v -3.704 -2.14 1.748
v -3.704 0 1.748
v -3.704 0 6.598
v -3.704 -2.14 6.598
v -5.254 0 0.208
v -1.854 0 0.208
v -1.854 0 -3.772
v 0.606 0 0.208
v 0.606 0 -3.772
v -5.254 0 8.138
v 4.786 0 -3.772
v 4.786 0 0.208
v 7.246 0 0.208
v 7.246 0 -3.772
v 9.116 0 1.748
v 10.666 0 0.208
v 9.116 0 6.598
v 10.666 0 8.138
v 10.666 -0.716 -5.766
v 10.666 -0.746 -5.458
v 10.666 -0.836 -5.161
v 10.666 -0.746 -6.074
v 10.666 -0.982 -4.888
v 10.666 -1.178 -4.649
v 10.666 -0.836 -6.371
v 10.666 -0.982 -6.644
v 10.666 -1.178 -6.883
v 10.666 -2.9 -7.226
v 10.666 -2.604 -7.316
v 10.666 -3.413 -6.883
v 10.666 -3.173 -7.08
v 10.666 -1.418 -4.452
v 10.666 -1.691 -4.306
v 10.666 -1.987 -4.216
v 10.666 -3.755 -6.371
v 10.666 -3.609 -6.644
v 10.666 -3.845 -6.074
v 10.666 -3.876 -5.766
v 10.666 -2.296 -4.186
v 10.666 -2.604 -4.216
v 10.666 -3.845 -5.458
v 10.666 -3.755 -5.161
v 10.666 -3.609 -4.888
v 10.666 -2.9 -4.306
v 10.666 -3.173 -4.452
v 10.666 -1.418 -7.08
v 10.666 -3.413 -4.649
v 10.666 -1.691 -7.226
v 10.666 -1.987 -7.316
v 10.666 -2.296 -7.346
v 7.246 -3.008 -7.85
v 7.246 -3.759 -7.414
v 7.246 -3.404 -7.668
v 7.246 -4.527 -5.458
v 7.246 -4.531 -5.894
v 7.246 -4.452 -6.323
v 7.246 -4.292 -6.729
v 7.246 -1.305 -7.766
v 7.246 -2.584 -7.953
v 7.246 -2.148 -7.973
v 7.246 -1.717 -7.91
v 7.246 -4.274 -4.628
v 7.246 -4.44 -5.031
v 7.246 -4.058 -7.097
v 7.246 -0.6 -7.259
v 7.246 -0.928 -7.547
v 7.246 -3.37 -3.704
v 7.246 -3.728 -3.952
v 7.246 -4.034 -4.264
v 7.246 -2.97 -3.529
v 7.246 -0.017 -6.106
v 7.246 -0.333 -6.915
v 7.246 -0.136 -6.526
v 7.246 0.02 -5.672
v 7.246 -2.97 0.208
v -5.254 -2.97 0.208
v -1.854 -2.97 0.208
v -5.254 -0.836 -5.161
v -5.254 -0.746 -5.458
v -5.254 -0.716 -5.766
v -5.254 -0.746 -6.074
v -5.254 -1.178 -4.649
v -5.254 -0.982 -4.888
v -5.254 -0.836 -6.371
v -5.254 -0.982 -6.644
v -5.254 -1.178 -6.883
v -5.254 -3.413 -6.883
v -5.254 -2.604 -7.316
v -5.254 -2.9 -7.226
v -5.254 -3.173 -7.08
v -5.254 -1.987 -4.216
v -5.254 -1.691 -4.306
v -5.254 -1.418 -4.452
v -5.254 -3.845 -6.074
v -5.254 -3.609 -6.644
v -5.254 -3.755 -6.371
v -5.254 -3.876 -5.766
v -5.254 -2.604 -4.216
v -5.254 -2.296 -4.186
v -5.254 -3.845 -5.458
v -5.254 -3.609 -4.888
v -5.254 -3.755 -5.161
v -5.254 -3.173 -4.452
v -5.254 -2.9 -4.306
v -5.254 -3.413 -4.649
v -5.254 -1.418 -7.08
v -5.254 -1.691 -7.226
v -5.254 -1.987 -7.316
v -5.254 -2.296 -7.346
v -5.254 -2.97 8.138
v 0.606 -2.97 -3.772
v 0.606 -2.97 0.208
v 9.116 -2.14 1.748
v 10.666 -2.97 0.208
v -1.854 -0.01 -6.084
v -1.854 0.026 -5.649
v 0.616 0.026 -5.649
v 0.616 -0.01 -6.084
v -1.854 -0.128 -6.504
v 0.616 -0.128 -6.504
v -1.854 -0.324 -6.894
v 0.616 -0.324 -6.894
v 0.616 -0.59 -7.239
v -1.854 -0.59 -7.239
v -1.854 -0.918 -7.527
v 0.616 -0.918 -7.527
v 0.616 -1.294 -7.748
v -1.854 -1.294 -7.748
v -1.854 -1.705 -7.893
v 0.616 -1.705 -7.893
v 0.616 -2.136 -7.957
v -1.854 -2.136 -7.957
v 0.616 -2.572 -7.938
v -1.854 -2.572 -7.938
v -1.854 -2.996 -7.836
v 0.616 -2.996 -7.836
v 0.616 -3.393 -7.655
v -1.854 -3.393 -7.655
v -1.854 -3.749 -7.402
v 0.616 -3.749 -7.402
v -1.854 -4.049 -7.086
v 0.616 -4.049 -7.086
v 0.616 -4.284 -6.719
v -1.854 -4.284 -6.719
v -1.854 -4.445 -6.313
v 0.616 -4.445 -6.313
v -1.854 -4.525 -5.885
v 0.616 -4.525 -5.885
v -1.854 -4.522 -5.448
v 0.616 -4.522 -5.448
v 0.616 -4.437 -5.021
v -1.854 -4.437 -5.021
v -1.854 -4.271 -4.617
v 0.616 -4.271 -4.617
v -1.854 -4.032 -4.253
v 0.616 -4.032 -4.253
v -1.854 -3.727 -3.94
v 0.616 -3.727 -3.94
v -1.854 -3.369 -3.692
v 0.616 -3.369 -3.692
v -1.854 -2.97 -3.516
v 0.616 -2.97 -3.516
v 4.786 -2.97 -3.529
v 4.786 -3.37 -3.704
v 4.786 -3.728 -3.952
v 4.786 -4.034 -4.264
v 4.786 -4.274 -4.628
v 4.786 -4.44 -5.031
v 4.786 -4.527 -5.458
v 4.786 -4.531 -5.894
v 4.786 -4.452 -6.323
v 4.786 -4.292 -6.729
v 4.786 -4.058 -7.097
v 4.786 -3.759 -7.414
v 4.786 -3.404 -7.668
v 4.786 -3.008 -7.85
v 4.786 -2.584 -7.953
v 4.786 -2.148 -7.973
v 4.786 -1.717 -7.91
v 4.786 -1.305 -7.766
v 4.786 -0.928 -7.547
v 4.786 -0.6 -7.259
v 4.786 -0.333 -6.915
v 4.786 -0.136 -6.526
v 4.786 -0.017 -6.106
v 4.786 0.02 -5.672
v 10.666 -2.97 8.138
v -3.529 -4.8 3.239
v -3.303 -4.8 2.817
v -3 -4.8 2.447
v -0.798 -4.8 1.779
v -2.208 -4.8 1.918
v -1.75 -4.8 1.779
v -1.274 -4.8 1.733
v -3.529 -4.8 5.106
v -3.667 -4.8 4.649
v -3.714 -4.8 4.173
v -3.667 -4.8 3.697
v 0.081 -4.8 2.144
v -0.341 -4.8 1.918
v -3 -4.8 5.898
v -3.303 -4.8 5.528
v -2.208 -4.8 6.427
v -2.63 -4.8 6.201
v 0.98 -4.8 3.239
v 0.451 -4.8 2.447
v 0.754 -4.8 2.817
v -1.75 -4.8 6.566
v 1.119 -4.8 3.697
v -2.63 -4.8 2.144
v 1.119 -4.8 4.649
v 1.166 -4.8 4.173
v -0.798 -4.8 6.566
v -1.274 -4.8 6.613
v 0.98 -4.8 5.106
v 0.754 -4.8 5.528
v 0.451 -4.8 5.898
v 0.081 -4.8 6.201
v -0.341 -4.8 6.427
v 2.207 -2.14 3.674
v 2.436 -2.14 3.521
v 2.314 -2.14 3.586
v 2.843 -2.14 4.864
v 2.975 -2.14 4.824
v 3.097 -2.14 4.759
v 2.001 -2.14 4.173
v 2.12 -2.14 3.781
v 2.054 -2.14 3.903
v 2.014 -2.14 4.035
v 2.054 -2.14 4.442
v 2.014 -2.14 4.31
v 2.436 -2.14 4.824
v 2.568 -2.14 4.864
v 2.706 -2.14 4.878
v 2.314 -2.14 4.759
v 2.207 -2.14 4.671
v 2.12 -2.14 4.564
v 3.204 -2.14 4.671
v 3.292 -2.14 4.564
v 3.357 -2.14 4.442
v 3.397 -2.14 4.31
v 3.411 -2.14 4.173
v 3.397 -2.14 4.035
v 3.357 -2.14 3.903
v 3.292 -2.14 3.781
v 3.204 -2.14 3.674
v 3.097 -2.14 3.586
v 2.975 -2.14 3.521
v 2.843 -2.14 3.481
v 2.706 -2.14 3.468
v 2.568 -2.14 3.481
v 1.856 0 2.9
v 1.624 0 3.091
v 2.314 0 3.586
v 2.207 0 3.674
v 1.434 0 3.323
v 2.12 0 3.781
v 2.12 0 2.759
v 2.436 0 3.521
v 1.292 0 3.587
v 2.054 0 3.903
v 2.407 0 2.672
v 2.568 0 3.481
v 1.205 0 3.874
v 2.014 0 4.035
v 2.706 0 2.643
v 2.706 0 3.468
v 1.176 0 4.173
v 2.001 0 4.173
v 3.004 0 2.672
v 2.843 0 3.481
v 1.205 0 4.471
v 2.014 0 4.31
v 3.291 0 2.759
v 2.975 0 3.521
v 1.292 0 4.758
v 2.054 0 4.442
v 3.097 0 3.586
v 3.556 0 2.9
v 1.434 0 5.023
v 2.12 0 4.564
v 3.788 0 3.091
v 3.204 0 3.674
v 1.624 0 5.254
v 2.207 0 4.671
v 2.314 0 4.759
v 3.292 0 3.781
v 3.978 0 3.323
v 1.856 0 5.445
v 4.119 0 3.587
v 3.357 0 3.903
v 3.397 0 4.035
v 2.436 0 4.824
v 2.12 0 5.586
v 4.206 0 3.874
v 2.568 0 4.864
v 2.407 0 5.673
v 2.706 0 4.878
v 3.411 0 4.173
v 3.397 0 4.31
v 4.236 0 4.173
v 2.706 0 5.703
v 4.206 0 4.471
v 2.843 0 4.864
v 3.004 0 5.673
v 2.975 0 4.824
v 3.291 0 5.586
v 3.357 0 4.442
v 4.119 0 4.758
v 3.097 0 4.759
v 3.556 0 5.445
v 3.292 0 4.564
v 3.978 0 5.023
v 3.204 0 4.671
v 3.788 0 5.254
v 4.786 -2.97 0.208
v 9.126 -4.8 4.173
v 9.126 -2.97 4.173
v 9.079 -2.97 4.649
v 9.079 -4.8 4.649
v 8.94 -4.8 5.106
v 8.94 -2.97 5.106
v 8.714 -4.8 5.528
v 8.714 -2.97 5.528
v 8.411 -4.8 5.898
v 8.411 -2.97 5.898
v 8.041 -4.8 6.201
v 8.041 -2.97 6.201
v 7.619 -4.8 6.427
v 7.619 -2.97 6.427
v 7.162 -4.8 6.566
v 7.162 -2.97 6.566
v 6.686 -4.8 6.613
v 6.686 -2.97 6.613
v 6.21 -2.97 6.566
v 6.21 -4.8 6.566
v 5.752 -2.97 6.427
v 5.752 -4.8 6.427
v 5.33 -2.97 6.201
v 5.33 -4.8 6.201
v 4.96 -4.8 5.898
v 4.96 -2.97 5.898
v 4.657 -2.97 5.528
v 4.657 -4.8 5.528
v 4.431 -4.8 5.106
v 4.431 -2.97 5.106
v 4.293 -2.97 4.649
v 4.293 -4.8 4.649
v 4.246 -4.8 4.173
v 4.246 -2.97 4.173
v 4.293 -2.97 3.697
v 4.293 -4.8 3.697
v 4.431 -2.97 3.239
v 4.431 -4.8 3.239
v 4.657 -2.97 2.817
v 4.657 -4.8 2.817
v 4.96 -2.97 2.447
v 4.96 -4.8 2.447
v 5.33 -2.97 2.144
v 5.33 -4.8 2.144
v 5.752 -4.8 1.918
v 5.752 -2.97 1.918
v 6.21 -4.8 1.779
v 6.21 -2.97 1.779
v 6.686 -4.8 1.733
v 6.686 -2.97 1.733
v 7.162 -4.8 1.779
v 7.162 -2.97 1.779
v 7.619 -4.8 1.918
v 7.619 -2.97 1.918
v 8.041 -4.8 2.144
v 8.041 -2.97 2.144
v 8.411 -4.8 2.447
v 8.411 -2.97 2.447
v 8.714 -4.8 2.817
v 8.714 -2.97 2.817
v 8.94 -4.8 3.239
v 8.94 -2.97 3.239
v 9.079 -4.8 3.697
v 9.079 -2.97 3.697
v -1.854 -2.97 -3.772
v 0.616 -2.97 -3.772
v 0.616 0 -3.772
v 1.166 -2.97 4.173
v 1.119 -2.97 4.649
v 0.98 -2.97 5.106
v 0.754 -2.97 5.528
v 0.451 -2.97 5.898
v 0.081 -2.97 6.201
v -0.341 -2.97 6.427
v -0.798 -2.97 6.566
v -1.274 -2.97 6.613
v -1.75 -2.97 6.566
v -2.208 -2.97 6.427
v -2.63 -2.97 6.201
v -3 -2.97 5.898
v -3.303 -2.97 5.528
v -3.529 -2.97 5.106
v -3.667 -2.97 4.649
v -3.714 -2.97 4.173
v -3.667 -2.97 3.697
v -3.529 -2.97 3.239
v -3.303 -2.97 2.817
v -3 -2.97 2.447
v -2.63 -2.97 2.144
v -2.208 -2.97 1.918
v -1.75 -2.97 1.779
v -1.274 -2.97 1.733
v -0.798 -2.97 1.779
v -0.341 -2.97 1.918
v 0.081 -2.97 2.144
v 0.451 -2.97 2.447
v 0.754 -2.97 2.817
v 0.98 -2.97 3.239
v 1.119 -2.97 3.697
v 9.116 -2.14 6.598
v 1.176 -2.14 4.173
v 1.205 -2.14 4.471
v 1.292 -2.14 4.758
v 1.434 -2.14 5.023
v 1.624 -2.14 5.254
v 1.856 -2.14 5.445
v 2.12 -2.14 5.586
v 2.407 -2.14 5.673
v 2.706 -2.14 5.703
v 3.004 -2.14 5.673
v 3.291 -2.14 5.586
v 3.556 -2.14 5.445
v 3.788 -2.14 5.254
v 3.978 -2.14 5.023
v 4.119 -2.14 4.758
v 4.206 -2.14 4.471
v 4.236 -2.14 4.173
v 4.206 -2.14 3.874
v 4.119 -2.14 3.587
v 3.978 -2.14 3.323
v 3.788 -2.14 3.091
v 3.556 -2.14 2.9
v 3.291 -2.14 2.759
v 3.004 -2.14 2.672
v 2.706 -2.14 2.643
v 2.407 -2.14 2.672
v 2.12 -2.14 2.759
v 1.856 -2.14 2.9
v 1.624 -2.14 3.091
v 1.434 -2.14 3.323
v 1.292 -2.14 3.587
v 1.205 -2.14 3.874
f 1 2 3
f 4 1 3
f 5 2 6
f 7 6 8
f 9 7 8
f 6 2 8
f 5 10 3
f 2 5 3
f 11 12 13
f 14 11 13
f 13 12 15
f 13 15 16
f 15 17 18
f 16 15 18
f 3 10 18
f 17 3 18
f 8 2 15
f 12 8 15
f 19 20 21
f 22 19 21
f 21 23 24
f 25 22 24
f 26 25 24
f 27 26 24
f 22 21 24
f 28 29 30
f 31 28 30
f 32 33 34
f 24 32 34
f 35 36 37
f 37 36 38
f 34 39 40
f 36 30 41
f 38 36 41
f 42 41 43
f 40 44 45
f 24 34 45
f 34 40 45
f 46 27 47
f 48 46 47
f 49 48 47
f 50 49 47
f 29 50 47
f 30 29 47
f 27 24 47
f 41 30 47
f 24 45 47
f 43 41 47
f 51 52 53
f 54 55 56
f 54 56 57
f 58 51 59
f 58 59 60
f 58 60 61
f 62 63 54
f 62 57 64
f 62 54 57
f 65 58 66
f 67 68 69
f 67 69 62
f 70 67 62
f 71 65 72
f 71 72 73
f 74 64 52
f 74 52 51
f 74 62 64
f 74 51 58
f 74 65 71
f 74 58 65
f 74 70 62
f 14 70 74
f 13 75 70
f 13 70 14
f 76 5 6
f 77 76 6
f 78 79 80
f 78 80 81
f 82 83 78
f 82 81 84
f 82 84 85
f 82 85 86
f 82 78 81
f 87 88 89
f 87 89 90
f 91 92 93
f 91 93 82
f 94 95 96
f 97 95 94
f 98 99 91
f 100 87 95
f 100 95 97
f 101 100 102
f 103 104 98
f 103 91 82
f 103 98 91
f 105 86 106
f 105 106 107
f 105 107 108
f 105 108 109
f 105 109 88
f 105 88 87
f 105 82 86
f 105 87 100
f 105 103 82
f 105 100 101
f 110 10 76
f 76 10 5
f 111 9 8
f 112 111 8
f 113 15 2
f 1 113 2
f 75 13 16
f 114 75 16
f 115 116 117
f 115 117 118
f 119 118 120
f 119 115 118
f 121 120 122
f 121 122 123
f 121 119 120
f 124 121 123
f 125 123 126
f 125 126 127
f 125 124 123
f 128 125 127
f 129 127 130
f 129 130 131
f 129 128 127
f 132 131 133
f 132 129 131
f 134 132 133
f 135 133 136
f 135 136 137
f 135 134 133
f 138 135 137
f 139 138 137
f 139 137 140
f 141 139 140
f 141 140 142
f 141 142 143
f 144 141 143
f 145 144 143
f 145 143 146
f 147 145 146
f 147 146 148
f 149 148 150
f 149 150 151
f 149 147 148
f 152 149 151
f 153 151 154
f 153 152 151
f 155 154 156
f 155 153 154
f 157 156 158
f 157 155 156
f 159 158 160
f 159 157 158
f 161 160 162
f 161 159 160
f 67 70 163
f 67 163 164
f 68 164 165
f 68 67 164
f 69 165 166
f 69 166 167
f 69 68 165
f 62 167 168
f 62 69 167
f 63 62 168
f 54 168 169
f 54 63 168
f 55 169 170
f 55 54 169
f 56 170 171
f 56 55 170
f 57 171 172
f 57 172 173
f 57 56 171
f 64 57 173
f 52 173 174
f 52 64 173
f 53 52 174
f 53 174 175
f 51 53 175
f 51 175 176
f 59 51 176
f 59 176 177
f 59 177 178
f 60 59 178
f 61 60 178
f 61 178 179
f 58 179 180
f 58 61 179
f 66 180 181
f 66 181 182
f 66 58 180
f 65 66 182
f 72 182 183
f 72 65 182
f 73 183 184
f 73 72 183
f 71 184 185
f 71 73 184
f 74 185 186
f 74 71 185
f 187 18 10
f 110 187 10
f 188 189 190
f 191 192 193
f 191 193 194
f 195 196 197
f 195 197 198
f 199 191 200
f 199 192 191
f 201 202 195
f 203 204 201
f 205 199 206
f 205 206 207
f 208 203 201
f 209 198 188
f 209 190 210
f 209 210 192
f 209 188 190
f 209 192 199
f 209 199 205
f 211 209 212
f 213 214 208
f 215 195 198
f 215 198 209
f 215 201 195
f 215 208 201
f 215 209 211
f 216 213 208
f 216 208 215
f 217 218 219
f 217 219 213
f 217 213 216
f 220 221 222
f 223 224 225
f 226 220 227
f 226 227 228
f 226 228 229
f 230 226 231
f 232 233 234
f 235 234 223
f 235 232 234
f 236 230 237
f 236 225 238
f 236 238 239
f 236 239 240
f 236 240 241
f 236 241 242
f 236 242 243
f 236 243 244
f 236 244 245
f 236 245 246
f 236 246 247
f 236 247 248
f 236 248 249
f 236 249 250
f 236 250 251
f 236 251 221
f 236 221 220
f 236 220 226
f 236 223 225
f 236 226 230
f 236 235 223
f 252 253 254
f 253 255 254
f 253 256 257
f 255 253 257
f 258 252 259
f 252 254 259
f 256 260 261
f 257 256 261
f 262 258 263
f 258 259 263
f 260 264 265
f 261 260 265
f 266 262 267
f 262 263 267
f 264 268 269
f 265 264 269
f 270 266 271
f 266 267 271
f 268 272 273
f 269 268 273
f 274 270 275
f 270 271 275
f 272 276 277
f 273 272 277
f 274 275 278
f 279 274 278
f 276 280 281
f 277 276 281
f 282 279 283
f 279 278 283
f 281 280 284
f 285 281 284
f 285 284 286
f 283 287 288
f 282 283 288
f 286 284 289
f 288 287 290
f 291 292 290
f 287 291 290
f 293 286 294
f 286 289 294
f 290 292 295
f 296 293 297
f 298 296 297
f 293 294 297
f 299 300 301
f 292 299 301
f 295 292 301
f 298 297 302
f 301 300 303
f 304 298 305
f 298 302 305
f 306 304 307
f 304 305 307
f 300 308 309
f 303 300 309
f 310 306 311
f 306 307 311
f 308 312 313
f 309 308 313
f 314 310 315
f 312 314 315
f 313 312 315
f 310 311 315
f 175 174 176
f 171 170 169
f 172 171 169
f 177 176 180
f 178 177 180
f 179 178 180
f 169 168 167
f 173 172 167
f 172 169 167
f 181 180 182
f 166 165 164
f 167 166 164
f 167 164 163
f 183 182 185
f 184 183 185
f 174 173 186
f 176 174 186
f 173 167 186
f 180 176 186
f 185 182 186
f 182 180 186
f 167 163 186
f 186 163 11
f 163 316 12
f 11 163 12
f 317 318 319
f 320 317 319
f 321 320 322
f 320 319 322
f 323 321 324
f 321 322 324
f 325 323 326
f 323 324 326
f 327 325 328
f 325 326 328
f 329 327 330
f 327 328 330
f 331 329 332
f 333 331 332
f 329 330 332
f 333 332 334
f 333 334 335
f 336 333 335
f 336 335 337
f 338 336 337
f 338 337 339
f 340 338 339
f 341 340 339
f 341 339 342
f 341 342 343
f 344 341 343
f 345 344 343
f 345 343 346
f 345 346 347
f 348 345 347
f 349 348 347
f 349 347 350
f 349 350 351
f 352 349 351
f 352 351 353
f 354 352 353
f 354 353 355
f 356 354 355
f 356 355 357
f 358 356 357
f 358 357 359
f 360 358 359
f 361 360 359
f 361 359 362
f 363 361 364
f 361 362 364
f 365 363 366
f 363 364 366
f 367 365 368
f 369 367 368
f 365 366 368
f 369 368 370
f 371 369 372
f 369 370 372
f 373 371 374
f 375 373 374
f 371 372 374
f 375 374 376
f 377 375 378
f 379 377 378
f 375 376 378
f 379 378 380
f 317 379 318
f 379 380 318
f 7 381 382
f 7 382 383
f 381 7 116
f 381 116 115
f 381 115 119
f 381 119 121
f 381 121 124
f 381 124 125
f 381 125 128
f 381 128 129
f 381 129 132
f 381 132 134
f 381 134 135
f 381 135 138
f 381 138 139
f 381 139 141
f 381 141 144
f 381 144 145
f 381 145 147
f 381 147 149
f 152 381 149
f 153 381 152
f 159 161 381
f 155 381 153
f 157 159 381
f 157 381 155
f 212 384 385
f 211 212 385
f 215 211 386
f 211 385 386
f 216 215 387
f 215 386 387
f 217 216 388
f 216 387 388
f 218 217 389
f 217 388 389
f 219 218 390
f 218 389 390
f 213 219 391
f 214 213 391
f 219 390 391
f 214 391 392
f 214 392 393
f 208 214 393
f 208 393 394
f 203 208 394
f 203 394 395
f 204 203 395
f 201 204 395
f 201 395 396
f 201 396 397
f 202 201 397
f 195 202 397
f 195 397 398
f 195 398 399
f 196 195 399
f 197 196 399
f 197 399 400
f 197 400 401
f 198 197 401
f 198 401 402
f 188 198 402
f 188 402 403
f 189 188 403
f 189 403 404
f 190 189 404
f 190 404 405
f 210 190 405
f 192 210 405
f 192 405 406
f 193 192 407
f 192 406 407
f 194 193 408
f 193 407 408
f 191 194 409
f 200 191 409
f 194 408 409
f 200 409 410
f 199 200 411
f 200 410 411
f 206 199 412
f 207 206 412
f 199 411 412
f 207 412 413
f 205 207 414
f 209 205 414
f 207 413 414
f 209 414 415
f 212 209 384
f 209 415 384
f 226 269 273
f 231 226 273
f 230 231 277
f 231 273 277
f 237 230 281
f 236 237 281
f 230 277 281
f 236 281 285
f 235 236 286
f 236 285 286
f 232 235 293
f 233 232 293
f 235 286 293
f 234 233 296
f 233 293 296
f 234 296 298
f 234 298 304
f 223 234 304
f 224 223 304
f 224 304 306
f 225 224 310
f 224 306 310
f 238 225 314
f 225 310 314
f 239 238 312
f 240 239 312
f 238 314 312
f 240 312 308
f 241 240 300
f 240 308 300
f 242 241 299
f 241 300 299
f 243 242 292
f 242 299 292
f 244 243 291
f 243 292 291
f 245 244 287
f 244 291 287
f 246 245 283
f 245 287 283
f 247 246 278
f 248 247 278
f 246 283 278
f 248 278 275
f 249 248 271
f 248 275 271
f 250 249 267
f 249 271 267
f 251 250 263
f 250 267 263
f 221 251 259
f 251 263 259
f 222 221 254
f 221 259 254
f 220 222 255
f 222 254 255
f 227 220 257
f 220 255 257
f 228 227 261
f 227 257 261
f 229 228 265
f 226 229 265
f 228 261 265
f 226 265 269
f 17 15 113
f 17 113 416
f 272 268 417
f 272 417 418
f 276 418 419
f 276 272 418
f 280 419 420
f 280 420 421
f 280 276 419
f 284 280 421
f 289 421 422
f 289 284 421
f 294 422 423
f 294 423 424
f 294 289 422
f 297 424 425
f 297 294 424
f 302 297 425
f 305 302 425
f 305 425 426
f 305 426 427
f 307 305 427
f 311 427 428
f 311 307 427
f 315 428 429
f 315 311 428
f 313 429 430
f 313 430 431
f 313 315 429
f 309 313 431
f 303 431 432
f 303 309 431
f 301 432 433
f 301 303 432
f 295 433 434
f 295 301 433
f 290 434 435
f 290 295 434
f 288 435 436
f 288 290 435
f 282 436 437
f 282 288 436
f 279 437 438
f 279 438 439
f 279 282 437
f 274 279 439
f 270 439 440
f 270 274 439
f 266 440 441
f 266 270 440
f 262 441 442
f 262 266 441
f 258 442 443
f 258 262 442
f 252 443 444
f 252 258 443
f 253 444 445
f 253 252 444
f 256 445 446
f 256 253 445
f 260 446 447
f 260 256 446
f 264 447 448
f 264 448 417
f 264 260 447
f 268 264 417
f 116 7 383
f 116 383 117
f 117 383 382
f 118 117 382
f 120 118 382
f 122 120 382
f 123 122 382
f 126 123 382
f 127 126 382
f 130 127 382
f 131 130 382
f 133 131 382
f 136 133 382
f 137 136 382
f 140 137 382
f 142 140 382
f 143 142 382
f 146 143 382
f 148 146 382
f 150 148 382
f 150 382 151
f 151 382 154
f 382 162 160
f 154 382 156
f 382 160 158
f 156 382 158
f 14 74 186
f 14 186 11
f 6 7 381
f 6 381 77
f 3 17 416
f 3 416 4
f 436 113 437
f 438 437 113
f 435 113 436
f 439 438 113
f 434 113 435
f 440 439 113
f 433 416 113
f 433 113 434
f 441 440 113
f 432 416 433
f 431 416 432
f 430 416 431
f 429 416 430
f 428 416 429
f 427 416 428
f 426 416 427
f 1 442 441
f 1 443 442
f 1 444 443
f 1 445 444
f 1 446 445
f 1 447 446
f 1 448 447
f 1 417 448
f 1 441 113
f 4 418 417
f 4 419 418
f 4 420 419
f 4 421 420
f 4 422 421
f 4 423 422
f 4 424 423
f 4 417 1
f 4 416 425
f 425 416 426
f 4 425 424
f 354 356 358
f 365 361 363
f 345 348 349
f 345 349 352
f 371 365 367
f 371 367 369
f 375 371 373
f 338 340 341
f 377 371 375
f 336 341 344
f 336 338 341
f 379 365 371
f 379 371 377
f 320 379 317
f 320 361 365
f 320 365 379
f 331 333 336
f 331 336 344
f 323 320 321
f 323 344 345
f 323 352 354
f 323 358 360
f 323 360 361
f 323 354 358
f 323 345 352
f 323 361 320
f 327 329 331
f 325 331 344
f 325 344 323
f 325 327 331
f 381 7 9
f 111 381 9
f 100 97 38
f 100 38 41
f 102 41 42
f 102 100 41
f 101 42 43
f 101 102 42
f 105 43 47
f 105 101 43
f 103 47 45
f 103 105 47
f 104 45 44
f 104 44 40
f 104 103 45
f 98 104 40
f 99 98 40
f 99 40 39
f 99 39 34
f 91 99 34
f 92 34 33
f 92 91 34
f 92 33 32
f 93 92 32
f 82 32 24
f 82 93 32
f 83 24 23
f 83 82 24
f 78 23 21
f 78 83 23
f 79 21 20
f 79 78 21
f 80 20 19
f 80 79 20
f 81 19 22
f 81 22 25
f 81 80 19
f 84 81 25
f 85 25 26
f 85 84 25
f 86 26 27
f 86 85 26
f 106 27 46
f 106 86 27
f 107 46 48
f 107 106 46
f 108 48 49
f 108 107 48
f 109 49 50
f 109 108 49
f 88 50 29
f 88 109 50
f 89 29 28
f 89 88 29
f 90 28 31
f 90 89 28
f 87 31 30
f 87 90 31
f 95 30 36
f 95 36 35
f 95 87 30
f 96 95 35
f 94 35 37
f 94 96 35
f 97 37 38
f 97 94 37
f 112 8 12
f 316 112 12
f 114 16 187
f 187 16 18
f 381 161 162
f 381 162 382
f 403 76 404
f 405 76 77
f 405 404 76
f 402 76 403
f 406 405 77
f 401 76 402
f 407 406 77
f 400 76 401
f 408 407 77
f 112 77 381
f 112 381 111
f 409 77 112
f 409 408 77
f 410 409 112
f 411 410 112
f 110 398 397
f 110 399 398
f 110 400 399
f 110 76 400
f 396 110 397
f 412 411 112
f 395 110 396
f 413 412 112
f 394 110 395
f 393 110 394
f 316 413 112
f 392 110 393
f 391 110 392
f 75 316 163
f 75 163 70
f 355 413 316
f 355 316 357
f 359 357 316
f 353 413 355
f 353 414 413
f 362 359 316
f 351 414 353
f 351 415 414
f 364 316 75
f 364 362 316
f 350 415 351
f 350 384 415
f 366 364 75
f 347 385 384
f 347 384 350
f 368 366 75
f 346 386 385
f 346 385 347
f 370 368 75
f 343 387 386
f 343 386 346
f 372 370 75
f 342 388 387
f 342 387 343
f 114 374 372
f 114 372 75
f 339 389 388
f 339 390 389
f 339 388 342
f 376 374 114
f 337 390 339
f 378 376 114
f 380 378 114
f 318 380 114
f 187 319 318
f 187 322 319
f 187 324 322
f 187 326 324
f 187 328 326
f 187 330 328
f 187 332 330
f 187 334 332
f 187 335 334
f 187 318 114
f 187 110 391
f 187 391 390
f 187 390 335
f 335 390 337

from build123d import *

# Parameters (mm, degrees)
F0_R      = 2.44
F0_W      = 2.46
F0_H      = 3.98
F1_DEPTH  = 2.97
F2_DEPTH  = 4.8
F4_DEPTH  = 2.47
F6_DEPTH  = 2.46
F7_R      = 1.58
F8_DEPTH  = 15.92
F9_W      = 12.82
F9_H      = 4.85
F9_R      = 1.53
F9_R_2    = 0.705
F10_DEPTH = 2.14


with BuildPart() as f1:
    # F0 (on Front) → F1 (new body)
    with BuildSketch(Plane.XZ):
        Polygon((10.665693, 8.13761), (-5.254307, 8.13761), (-5.254307, 0.20761), (-1.853968, 0.20761), (0.606032, 0.20761), (4.786032, 0.20761), (7.246032, 0.20761), (10.665693, 0.20761), align=None)
        with Locations((-1.274307, 4.17261)):
            Circle(F0_R, mode=Mode.SUBTRACT)
        with Locations((6.685693, 4.17261)):
            Circle(F0_R, mode=Mode.SUBTRACT)
        with Locations((-0.623968, -1.78239)):
            Rectangle(F0_W, F0_H)
        with Locations((6.016032, -1.78239)):
            Rectangle(F0_W, F0_H)
    extrude(amount=F1_DEPTH)

    # F0 (on Front) → F2 (join)
    with BuildSketch(Plane.XZ):
        with Locations((-1.274307, 4.17261)):
            Circle(F0_R)
        with Locations((6.685693, 4.17261)):
            Circle(F0_R)
    extrude(amount=F2_DEPTH)

    # F5 (on face) → F6 (join)
    with BuildSketch(Plane.YZ.offset(7.246032)):
        with BuildLine():
            Line((-2.97, -3.77239), (-2.97, -3.529404))
            ThreePointArc((-2.97, -3.529404), (-3.587329, -7.549392), (0.020303, -5.671523))
            Line((0.020303, -5.671523), (0, -3.77239))
            Line((0, -3.77239), (-2.97, -3.77239))
        make_face()
    extrude(amount=-F6_DEPTH)

    # F9 (on face) → F10 (cut)
    with BuildSketch(Plane(origin=(0, 0, 0), x_dir=(-1, 0, 0), z_dir=(0, 1, 0))):
        with Locations((-2.705693, 4.17261)):
            Rectangle(F9_W, F9_H)
        with Locations((-2.705693, 4.17261)):
            Circle(F9_R, mode=Mode.SUBTRACT)
        with Locations((-2.705693, 4.17261)):
            Circle(F9_R_2)
    extrude(amount=-F10_DEPTH, mode=Mode.SUBTRACT)


with BuildPart() as f4:
    # F3 (on face) → F4 (new body)
    with BuildSketch(Plane(origin=(-1.853968, 0, 0), x_dir=(0, -1, 0), z_dir=(-1, 0, 0))):
        with BuildLine():
            Line((0, -3.77239), (-0.025561, -5.649281))
            ThreePointArc((-0.025561, -5.649281), (3.576987, -7.537399), (2.97, -3.515595))
            Line((2.97, -3.515595), (2.97, -3.77239))
            Line((2.97, -3.77239), (0, -3.77239))
        make_face()
    extrude(amount=-F4_DEPTH)


with BuildPart() as f8:
    # F7 (on face) → F8 (new body)
    with BuildSketch(Plane(origin=(-5.254307, 0, 0), x_dir=(0, -1, 0), z_dir=(-1, 0, 0))):
        with Locations((2.295694, -5.765911)):
            Circle(F7_R)
    extrude(amount=-F8_DEPTH)


solid = Compound([f1.part, f4.part, f8.part])
